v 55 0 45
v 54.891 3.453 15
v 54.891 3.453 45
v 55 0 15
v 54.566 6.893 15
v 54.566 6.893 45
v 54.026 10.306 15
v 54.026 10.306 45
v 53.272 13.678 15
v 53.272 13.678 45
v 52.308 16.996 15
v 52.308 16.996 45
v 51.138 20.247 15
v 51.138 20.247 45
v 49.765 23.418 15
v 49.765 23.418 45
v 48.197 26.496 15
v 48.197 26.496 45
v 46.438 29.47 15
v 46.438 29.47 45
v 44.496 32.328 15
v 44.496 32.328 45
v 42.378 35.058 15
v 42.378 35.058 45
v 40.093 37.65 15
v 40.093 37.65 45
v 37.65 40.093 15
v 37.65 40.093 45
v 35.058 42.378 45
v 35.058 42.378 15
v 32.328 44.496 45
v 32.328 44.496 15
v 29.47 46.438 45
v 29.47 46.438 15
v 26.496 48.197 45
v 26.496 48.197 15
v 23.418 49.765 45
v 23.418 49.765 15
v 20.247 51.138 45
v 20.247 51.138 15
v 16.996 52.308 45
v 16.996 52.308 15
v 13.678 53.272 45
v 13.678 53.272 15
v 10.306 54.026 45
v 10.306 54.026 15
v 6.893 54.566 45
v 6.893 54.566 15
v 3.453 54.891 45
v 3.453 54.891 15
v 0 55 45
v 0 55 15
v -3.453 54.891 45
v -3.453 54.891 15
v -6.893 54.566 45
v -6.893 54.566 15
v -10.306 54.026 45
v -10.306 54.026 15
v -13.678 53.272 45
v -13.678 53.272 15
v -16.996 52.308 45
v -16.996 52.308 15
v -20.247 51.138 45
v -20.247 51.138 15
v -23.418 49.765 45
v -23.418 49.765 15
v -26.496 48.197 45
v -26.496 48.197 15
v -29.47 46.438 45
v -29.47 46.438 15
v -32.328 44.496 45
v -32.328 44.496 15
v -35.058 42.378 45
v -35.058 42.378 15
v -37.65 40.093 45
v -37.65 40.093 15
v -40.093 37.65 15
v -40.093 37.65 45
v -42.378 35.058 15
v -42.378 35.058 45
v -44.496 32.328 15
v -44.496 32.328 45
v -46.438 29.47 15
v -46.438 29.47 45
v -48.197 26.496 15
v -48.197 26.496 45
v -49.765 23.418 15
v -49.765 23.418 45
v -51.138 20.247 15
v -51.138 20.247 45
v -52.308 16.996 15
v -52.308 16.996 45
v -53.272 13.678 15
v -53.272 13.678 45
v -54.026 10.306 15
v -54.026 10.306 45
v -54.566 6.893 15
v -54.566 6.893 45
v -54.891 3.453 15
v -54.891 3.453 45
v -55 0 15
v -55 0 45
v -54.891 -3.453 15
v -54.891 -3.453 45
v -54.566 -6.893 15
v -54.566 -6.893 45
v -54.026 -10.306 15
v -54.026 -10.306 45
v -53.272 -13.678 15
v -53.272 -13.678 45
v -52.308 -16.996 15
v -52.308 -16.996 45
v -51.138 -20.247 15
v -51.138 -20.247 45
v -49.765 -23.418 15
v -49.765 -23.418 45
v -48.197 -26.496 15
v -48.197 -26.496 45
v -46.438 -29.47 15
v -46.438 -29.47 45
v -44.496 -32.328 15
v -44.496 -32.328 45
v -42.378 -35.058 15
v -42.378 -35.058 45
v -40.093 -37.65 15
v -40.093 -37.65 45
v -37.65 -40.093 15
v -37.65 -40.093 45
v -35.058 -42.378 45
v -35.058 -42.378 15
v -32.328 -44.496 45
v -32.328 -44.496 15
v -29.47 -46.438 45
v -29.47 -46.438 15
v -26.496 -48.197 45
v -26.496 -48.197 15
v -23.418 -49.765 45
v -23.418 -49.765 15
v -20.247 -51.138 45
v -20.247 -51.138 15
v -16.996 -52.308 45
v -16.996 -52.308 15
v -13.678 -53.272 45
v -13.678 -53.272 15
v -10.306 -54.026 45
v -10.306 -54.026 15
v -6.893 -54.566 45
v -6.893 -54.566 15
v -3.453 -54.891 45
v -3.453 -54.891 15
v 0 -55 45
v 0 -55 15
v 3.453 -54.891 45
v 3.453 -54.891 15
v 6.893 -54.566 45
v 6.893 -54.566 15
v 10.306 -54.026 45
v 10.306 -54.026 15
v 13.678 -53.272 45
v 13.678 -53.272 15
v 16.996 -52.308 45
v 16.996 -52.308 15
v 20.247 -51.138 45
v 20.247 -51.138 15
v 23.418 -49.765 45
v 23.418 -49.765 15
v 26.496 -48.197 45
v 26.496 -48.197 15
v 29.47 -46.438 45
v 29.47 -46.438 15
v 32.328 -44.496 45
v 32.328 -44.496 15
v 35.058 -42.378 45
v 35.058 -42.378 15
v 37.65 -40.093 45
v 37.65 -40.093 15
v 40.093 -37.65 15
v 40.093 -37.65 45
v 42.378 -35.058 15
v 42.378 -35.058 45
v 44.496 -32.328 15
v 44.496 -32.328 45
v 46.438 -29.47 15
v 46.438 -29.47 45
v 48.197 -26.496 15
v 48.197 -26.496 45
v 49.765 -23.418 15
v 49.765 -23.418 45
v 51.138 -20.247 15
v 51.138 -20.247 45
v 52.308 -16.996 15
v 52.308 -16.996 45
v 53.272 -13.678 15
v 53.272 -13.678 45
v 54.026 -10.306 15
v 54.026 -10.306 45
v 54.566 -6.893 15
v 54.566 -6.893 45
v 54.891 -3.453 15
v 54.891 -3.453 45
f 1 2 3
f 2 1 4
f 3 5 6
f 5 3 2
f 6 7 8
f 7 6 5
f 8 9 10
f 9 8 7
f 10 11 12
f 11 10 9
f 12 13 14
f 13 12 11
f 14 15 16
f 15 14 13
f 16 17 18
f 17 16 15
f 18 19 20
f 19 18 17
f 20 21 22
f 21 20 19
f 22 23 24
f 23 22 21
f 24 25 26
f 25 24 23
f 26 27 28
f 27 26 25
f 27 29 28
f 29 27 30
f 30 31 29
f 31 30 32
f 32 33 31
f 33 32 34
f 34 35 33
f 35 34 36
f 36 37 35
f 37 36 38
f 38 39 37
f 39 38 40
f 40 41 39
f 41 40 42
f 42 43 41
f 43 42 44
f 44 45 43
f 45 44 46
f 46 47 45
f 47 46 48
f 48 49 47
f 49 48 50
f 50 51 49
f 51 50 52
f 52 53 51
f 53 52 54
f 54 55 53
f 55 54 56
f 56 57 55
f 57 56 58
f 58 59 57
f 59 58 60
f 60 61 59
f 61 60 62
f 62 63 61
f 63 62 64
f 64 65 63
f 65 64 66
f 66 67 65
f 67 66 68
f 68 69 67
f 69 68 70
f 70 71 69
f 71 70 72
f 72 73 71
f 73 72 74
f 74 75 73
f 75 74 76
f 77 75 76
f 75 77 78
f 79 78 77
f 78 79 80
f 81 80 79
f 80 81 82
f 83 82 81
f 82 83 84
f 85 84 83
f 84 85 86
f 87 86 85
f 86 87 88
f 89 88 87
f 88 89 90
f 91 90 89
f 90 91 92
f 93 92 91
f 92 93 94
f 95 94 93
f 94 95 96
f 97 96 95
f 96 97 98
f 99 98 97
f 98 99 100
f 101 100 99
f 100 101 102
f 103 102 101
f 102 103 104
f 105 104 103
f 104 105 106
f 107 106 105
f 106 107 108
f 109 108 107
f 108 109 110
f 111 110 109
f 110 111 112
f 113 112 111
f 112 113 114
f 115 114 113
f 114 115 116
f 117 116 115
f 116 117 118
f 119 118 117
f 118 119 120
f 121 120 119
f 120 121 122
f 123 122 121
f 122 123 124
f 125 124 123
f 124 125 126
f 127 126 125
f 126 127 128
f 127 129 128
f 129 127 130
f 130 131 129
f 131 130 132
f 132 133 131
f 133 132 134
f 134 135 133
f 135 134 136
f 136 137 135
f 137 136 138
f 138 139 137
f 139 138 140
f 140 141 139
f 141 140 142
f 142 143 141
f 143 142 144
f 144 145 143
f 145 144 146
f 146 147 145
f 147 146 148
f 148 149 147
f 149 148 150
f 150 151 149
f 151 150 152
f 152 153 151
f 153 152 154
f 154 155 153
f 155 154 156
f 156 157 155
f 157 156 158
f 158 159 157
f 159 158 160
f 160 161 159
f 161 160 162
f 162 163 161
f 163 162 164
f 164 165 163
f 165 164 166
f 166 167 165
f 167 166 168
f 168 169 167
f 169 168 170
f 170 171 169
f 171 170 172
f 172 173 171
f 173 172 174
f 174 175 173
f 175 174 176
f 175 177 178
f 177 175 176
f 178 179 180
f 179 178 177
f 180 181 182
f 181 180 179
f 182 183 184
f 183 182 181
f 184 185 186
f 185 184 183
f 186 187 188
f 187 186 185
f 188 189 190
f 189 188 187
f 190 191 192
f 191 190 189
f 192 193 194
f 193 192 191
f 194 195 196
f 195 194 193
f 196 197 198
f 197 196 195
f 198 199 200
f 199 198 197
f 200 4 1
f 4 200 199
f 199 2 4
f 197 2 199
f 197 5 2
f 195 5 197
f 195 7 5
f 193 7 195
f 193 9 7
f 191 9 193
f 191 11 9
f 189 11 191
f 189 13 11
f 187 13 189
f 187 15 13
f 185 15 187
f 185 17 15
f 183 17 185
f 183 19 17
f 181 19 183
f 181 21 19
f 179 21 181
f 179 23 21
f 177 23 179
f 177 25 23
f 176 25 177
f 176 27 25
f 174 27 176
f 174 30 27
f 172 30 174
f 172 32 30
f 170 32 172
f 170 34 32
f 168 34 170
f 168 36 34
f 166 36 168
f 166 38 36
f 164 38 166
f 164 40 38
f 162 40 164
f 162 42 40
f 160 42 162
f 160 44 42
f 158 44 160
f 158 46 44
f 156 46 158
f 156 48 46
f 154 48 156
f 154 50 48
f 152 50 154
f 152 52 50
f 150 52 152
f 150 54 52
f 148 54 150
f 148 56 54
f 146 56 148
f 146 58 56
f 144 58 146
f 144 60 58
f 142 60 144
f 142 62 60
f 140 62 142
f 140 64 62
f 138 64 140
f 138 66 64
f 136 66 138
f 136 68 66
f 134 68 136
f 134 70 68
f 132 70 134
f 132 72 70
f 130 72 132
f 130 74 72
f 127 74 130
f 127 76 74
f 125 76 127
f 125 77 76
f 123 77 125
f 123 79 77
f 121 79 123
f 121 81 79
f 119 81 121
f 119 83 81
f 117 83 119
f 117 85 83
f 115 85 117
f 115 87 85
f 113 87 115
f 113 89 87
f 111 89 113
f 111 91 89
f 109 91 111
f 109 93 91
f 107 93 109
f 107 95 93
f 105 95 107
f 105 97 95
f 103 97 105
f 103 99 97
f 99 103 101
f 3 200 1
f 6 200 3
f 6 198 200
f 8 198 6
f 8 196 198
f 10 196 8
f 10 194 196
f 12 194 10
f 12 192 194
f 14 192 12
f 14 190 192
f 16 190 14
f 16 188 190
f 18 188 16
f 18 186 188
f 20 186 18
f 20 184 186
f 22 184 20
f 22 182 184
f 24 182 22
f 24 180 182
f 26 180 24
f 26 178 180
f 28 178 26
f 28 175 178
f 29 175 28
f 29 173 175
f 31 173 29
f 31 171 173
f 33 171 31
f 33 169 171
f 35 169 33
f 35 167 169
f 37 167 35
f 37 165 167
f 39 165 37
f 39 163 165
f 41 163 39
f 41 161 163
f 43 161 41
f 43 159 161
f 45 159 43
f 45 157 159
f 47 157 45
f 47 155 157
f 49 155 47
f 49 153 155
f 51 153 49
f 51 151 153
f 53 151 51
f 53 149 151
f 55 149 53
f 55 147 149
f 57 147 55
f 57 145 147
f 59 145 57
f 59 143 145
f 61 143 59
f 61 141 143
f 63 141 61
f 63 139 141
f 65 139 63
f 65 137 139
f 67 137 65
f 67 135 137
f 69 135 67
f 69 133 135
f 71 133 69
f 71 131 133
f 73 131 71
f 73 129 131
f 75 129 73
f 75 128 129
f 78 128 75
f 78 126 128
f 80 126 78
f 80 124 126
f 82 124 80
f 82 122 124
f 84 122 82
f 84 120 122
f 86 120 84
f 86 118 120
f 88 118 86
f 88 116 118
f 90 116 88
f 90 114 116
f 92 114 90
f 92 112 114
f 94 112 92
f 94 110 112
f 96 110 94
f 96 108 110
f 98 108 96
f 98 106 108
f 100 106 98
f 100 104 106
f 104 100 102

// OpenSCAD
$fn=100;

//square([30,10]);

//#translate([0,10,0]) square([110/2,30]);

translate([0,0,15]) cylinder(h=30,d=110);

%rotate_extrude() {
    translate([0,-5,0]) square([45,15]);
    translate([45,0,0]) bend2(50,10,0);
    translate([25-10+45,25,0]) square([10,20]);
}

module bend(a,w) {
    difference() {
        circle(d=a);
        circle(d=a-w);
        translate([-(a+2)/2,0,0]) square(a+2);
        translate([-(a*2)/2,-a+1,0]) square(a);
    }
}

module bend2(a,w,t) {
    translate([0,a/2,0]) difference() {
        circle(d=a);
        circle(d=a-w*2);
        translate([-(a+t*2)/2,0,0]) square(a);
        translate([-(a*2)/2,-a+1,0]) square(a);
    }
}
